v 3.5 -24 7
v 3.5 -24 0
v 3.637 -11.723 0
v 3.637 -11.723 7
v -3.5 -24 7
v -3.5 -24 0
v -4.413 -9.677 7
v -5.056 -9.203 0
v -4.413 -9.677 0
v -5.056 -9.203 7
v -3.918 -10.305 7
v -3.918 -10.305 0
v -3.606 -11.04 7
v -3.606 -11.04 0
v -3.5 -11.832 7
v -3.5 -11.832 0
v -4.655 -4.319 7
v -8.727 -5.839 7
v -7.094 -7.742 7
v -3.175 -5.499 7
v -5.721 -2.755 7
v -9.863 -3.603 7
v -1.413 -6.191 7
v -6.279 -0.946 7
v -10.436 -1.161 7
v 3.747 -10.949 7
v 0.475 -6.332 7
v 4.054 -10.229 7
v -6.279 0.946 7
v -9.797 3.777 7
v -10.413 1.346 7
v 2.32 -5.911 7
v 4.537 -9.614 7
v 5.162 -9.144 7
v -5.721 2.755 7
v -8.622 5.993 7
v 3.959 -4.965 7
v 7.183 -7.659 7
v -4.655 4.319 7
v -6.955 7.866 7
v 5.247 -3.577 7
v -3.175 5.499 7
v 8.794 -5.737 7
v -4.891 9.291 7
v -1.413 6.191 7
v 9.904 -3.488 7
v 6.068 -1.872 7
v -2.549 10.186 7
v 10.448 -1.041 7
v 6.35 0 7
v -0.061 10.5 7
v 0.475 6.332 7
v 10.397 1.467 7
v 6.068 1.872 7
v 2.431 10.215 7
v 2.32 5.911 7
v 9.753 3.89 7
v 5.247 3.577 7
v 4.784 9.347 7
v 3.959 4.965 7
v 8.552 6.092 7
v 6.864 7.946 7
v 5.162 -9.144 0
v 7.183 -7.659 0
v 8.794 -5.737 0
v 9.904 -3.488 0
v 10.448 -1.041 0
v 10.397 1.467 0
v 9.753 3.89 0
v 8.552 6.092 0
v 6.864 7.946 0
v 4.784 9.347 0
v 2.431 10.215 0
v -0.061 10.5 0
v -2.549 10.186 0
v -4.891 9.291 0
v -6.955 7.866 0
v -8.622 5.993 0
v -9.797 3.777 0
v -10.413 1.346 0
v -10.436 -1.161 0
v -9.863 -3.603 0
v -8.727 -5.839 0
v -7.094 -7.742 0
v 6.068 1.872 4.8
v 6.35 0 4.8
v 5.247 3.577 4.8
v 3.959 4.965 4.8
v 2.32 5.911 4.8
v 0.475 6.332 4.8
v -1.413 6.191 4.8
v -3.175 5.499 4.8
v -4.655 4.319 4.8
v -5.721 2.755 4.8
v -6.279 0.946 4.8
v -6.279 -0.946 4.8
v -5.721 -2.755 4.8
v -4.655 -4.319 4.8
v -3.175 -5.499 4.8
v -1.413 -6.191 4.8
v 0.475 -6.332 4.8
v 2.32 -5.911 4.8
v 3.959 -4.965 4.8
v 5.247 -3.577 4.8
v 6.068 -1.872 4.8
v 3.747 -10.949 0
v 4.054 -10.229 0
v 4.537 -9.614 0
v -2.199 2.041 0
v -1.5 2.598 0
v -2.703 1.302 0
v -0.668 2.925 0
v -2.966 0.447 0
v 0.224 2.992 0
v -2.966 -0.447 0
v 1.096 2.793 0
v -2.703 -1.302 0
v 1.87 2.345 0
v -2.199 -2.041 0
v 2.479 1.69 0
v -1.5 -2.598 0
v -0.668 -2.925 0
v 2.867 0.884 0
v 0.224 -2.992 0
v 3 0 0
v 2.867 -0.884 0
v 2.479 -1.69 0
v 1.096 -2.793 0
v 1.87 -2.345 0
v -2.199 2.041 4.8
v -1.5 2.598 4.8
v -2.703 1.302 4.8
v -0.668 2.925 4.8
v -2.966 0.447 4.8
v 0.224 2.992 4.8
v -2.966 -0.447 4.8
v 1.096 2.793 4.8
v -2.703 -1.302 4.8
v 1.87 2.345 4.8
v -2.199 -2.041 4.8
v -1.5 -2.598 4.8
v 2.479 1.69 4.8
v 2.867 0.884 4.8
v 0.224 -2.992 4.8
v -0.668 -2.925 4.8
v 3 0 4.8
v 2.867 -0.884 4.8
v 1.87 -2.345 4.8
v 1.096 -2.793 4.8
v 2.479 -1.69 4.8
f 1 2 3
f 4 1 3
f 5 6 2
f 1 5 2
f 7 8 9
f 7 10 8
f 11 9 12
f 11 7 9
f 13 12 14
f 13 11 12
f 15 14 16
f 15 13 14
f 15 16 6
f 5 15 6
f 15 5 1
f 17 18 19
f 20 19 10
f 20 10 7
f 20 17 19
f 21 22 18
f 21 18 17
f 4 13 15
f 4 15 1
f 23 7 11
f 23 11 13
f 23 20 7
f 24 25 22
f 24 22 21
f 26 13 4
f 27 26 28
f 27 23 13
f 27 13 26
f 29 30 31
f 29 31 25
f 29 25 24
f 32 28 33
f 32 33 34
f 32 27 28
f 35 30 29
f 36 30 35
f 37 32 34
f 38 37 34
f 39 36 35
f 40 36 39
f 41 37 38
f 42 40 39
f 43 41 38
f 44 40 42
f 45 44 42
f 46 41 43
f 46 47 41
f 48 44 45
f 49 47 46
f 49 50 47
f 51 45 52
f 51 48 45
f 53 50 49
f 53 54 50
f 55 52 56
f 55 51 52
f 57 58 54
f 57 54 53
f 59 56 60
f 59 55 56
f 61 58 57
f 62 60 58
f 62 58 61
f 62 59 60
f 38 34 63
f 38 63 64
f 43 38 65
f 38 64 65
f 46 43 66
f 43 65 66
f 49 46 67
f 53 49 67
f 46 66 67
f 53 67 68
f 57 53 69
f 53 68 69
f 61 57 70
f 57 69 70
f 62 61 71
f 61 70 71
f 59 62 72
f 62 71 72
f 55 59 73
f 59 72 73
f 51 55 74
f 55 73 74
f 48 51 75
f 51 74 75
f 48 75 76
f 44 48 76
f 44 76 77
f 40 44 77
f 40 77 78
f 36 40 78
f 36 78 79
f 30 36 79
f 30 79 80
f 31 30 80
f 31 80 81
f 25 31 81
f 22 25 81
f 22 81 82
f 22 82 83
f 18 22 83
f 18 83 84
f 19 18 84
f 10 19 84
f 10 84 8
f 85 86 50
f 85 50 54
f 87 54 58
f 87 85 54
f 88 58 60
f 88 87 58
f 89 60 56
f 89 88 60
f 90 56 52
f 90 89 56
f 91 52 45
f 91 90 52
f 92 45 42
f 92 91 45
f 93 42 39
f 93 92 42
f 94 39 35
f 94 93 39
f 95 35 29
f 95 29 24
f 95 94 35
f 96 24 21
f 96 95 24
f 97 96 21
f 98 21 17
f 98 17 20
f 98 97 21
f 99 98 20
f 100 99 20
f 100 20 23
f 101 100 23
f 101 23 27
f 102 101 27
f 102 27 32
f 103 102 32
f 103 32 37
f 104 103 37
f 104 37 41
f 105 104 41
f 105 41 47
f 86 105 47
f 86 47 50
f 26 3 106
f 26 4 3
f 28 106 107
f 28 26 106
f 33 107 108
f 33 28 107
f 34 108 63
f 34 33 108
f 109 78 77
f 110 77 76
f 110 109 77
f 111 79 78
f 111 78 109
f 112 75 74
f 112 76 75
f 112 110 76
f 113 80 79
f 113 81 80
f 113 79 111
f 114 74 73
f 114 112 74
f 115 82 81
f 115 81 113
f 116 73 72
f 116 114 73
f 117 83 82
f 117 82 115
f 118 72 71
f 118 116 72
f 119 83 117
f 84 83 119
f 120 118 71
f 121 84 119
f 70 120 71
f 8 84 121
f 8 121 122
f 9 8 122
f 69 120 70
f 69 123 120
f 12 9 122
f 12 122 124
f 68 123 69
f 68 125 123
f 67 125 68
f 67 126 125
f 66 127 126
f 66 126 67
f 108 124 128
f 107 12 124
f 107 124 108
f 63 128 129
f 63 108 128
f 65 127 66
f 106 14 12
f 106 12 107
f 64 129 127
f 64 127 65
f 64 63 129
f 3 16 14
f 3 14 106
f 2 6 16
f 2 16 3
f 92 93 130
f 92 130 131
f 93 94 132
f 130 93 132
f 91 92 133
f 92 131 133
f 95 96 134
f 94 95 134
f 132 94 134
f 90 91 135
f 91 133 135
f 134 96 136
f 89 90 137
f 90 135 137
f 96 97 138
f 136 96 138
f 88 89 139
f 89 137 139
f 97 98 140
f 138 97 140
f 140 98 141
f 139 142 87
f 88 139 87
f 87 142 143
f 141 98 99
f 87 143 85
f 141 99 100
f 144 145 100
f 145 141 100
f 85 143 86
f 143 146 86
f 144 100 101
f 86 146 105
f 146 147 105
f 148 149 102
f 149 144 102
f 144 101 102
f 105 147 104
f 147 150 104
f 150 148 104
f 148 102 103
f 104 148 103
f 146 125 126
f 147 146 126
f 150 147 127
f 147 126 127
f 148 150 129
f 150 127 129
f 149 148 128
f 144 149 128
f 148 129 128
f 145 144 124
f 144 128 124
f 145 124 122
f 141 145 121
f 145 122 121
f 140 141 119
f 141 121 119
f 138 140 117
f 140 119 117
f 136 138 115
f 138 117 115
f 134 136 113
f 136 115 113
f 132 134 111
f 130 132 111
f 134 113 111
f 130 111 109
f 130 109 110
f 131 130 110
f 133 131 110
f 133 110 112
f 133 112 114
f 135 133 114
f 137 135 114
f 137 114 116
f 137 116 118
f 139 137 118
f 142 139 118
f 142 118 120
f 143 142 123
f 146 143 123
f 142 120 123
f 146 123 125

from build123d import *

# Parameters (mm, degrees)
F0_R     = 6.35
F1_DEPTH = 7
F2_R     = 3
F3_R     = 6.35
F3_R_2   = 3
F4_DEPTH = 4.8


with BuildPart() as f1:
    # F0 (on Top) → F1 (new body)
    with BuildSketch(Plane.XY):
        with BuildLine():
            Line((3.5, -24), (3.657538, -9.842378))
            ThreePointArc((3.657538, -9.842378), (-0.083786, 10.499666), (-3.5, -9.899495))
            Line((-3.5, -9.899495), (-3.5, -24))
            Line((-3.5, -24), (3.5, -24))
        make_face()
        Circle(F0_R, mode=Mode.SUBTRACT)
    extrude(amount=F1_DEPTH)

    # F2
    f2_edges = [f1.edges().sort_by_distance(p)[0] for p in [
        (-3.5, -9.899495, 3.5),
        (3.657538, -9.842378, 3.5),
    ]]
    fillet(f2_edges, radius=F2_R)

    # F3 (on face) → F4 (join)
    with BuildSketch(Plane(origin=(0, 0, 0), x_dir=(1, 0, 0), z_dir=(0, 0, -1))):
        Circle(F3_R)
        Circle(F3_R_2, mode=Mode.SUBTRACT)
    extrude(amount=-F4_DEPTH)


solid = f1.part
